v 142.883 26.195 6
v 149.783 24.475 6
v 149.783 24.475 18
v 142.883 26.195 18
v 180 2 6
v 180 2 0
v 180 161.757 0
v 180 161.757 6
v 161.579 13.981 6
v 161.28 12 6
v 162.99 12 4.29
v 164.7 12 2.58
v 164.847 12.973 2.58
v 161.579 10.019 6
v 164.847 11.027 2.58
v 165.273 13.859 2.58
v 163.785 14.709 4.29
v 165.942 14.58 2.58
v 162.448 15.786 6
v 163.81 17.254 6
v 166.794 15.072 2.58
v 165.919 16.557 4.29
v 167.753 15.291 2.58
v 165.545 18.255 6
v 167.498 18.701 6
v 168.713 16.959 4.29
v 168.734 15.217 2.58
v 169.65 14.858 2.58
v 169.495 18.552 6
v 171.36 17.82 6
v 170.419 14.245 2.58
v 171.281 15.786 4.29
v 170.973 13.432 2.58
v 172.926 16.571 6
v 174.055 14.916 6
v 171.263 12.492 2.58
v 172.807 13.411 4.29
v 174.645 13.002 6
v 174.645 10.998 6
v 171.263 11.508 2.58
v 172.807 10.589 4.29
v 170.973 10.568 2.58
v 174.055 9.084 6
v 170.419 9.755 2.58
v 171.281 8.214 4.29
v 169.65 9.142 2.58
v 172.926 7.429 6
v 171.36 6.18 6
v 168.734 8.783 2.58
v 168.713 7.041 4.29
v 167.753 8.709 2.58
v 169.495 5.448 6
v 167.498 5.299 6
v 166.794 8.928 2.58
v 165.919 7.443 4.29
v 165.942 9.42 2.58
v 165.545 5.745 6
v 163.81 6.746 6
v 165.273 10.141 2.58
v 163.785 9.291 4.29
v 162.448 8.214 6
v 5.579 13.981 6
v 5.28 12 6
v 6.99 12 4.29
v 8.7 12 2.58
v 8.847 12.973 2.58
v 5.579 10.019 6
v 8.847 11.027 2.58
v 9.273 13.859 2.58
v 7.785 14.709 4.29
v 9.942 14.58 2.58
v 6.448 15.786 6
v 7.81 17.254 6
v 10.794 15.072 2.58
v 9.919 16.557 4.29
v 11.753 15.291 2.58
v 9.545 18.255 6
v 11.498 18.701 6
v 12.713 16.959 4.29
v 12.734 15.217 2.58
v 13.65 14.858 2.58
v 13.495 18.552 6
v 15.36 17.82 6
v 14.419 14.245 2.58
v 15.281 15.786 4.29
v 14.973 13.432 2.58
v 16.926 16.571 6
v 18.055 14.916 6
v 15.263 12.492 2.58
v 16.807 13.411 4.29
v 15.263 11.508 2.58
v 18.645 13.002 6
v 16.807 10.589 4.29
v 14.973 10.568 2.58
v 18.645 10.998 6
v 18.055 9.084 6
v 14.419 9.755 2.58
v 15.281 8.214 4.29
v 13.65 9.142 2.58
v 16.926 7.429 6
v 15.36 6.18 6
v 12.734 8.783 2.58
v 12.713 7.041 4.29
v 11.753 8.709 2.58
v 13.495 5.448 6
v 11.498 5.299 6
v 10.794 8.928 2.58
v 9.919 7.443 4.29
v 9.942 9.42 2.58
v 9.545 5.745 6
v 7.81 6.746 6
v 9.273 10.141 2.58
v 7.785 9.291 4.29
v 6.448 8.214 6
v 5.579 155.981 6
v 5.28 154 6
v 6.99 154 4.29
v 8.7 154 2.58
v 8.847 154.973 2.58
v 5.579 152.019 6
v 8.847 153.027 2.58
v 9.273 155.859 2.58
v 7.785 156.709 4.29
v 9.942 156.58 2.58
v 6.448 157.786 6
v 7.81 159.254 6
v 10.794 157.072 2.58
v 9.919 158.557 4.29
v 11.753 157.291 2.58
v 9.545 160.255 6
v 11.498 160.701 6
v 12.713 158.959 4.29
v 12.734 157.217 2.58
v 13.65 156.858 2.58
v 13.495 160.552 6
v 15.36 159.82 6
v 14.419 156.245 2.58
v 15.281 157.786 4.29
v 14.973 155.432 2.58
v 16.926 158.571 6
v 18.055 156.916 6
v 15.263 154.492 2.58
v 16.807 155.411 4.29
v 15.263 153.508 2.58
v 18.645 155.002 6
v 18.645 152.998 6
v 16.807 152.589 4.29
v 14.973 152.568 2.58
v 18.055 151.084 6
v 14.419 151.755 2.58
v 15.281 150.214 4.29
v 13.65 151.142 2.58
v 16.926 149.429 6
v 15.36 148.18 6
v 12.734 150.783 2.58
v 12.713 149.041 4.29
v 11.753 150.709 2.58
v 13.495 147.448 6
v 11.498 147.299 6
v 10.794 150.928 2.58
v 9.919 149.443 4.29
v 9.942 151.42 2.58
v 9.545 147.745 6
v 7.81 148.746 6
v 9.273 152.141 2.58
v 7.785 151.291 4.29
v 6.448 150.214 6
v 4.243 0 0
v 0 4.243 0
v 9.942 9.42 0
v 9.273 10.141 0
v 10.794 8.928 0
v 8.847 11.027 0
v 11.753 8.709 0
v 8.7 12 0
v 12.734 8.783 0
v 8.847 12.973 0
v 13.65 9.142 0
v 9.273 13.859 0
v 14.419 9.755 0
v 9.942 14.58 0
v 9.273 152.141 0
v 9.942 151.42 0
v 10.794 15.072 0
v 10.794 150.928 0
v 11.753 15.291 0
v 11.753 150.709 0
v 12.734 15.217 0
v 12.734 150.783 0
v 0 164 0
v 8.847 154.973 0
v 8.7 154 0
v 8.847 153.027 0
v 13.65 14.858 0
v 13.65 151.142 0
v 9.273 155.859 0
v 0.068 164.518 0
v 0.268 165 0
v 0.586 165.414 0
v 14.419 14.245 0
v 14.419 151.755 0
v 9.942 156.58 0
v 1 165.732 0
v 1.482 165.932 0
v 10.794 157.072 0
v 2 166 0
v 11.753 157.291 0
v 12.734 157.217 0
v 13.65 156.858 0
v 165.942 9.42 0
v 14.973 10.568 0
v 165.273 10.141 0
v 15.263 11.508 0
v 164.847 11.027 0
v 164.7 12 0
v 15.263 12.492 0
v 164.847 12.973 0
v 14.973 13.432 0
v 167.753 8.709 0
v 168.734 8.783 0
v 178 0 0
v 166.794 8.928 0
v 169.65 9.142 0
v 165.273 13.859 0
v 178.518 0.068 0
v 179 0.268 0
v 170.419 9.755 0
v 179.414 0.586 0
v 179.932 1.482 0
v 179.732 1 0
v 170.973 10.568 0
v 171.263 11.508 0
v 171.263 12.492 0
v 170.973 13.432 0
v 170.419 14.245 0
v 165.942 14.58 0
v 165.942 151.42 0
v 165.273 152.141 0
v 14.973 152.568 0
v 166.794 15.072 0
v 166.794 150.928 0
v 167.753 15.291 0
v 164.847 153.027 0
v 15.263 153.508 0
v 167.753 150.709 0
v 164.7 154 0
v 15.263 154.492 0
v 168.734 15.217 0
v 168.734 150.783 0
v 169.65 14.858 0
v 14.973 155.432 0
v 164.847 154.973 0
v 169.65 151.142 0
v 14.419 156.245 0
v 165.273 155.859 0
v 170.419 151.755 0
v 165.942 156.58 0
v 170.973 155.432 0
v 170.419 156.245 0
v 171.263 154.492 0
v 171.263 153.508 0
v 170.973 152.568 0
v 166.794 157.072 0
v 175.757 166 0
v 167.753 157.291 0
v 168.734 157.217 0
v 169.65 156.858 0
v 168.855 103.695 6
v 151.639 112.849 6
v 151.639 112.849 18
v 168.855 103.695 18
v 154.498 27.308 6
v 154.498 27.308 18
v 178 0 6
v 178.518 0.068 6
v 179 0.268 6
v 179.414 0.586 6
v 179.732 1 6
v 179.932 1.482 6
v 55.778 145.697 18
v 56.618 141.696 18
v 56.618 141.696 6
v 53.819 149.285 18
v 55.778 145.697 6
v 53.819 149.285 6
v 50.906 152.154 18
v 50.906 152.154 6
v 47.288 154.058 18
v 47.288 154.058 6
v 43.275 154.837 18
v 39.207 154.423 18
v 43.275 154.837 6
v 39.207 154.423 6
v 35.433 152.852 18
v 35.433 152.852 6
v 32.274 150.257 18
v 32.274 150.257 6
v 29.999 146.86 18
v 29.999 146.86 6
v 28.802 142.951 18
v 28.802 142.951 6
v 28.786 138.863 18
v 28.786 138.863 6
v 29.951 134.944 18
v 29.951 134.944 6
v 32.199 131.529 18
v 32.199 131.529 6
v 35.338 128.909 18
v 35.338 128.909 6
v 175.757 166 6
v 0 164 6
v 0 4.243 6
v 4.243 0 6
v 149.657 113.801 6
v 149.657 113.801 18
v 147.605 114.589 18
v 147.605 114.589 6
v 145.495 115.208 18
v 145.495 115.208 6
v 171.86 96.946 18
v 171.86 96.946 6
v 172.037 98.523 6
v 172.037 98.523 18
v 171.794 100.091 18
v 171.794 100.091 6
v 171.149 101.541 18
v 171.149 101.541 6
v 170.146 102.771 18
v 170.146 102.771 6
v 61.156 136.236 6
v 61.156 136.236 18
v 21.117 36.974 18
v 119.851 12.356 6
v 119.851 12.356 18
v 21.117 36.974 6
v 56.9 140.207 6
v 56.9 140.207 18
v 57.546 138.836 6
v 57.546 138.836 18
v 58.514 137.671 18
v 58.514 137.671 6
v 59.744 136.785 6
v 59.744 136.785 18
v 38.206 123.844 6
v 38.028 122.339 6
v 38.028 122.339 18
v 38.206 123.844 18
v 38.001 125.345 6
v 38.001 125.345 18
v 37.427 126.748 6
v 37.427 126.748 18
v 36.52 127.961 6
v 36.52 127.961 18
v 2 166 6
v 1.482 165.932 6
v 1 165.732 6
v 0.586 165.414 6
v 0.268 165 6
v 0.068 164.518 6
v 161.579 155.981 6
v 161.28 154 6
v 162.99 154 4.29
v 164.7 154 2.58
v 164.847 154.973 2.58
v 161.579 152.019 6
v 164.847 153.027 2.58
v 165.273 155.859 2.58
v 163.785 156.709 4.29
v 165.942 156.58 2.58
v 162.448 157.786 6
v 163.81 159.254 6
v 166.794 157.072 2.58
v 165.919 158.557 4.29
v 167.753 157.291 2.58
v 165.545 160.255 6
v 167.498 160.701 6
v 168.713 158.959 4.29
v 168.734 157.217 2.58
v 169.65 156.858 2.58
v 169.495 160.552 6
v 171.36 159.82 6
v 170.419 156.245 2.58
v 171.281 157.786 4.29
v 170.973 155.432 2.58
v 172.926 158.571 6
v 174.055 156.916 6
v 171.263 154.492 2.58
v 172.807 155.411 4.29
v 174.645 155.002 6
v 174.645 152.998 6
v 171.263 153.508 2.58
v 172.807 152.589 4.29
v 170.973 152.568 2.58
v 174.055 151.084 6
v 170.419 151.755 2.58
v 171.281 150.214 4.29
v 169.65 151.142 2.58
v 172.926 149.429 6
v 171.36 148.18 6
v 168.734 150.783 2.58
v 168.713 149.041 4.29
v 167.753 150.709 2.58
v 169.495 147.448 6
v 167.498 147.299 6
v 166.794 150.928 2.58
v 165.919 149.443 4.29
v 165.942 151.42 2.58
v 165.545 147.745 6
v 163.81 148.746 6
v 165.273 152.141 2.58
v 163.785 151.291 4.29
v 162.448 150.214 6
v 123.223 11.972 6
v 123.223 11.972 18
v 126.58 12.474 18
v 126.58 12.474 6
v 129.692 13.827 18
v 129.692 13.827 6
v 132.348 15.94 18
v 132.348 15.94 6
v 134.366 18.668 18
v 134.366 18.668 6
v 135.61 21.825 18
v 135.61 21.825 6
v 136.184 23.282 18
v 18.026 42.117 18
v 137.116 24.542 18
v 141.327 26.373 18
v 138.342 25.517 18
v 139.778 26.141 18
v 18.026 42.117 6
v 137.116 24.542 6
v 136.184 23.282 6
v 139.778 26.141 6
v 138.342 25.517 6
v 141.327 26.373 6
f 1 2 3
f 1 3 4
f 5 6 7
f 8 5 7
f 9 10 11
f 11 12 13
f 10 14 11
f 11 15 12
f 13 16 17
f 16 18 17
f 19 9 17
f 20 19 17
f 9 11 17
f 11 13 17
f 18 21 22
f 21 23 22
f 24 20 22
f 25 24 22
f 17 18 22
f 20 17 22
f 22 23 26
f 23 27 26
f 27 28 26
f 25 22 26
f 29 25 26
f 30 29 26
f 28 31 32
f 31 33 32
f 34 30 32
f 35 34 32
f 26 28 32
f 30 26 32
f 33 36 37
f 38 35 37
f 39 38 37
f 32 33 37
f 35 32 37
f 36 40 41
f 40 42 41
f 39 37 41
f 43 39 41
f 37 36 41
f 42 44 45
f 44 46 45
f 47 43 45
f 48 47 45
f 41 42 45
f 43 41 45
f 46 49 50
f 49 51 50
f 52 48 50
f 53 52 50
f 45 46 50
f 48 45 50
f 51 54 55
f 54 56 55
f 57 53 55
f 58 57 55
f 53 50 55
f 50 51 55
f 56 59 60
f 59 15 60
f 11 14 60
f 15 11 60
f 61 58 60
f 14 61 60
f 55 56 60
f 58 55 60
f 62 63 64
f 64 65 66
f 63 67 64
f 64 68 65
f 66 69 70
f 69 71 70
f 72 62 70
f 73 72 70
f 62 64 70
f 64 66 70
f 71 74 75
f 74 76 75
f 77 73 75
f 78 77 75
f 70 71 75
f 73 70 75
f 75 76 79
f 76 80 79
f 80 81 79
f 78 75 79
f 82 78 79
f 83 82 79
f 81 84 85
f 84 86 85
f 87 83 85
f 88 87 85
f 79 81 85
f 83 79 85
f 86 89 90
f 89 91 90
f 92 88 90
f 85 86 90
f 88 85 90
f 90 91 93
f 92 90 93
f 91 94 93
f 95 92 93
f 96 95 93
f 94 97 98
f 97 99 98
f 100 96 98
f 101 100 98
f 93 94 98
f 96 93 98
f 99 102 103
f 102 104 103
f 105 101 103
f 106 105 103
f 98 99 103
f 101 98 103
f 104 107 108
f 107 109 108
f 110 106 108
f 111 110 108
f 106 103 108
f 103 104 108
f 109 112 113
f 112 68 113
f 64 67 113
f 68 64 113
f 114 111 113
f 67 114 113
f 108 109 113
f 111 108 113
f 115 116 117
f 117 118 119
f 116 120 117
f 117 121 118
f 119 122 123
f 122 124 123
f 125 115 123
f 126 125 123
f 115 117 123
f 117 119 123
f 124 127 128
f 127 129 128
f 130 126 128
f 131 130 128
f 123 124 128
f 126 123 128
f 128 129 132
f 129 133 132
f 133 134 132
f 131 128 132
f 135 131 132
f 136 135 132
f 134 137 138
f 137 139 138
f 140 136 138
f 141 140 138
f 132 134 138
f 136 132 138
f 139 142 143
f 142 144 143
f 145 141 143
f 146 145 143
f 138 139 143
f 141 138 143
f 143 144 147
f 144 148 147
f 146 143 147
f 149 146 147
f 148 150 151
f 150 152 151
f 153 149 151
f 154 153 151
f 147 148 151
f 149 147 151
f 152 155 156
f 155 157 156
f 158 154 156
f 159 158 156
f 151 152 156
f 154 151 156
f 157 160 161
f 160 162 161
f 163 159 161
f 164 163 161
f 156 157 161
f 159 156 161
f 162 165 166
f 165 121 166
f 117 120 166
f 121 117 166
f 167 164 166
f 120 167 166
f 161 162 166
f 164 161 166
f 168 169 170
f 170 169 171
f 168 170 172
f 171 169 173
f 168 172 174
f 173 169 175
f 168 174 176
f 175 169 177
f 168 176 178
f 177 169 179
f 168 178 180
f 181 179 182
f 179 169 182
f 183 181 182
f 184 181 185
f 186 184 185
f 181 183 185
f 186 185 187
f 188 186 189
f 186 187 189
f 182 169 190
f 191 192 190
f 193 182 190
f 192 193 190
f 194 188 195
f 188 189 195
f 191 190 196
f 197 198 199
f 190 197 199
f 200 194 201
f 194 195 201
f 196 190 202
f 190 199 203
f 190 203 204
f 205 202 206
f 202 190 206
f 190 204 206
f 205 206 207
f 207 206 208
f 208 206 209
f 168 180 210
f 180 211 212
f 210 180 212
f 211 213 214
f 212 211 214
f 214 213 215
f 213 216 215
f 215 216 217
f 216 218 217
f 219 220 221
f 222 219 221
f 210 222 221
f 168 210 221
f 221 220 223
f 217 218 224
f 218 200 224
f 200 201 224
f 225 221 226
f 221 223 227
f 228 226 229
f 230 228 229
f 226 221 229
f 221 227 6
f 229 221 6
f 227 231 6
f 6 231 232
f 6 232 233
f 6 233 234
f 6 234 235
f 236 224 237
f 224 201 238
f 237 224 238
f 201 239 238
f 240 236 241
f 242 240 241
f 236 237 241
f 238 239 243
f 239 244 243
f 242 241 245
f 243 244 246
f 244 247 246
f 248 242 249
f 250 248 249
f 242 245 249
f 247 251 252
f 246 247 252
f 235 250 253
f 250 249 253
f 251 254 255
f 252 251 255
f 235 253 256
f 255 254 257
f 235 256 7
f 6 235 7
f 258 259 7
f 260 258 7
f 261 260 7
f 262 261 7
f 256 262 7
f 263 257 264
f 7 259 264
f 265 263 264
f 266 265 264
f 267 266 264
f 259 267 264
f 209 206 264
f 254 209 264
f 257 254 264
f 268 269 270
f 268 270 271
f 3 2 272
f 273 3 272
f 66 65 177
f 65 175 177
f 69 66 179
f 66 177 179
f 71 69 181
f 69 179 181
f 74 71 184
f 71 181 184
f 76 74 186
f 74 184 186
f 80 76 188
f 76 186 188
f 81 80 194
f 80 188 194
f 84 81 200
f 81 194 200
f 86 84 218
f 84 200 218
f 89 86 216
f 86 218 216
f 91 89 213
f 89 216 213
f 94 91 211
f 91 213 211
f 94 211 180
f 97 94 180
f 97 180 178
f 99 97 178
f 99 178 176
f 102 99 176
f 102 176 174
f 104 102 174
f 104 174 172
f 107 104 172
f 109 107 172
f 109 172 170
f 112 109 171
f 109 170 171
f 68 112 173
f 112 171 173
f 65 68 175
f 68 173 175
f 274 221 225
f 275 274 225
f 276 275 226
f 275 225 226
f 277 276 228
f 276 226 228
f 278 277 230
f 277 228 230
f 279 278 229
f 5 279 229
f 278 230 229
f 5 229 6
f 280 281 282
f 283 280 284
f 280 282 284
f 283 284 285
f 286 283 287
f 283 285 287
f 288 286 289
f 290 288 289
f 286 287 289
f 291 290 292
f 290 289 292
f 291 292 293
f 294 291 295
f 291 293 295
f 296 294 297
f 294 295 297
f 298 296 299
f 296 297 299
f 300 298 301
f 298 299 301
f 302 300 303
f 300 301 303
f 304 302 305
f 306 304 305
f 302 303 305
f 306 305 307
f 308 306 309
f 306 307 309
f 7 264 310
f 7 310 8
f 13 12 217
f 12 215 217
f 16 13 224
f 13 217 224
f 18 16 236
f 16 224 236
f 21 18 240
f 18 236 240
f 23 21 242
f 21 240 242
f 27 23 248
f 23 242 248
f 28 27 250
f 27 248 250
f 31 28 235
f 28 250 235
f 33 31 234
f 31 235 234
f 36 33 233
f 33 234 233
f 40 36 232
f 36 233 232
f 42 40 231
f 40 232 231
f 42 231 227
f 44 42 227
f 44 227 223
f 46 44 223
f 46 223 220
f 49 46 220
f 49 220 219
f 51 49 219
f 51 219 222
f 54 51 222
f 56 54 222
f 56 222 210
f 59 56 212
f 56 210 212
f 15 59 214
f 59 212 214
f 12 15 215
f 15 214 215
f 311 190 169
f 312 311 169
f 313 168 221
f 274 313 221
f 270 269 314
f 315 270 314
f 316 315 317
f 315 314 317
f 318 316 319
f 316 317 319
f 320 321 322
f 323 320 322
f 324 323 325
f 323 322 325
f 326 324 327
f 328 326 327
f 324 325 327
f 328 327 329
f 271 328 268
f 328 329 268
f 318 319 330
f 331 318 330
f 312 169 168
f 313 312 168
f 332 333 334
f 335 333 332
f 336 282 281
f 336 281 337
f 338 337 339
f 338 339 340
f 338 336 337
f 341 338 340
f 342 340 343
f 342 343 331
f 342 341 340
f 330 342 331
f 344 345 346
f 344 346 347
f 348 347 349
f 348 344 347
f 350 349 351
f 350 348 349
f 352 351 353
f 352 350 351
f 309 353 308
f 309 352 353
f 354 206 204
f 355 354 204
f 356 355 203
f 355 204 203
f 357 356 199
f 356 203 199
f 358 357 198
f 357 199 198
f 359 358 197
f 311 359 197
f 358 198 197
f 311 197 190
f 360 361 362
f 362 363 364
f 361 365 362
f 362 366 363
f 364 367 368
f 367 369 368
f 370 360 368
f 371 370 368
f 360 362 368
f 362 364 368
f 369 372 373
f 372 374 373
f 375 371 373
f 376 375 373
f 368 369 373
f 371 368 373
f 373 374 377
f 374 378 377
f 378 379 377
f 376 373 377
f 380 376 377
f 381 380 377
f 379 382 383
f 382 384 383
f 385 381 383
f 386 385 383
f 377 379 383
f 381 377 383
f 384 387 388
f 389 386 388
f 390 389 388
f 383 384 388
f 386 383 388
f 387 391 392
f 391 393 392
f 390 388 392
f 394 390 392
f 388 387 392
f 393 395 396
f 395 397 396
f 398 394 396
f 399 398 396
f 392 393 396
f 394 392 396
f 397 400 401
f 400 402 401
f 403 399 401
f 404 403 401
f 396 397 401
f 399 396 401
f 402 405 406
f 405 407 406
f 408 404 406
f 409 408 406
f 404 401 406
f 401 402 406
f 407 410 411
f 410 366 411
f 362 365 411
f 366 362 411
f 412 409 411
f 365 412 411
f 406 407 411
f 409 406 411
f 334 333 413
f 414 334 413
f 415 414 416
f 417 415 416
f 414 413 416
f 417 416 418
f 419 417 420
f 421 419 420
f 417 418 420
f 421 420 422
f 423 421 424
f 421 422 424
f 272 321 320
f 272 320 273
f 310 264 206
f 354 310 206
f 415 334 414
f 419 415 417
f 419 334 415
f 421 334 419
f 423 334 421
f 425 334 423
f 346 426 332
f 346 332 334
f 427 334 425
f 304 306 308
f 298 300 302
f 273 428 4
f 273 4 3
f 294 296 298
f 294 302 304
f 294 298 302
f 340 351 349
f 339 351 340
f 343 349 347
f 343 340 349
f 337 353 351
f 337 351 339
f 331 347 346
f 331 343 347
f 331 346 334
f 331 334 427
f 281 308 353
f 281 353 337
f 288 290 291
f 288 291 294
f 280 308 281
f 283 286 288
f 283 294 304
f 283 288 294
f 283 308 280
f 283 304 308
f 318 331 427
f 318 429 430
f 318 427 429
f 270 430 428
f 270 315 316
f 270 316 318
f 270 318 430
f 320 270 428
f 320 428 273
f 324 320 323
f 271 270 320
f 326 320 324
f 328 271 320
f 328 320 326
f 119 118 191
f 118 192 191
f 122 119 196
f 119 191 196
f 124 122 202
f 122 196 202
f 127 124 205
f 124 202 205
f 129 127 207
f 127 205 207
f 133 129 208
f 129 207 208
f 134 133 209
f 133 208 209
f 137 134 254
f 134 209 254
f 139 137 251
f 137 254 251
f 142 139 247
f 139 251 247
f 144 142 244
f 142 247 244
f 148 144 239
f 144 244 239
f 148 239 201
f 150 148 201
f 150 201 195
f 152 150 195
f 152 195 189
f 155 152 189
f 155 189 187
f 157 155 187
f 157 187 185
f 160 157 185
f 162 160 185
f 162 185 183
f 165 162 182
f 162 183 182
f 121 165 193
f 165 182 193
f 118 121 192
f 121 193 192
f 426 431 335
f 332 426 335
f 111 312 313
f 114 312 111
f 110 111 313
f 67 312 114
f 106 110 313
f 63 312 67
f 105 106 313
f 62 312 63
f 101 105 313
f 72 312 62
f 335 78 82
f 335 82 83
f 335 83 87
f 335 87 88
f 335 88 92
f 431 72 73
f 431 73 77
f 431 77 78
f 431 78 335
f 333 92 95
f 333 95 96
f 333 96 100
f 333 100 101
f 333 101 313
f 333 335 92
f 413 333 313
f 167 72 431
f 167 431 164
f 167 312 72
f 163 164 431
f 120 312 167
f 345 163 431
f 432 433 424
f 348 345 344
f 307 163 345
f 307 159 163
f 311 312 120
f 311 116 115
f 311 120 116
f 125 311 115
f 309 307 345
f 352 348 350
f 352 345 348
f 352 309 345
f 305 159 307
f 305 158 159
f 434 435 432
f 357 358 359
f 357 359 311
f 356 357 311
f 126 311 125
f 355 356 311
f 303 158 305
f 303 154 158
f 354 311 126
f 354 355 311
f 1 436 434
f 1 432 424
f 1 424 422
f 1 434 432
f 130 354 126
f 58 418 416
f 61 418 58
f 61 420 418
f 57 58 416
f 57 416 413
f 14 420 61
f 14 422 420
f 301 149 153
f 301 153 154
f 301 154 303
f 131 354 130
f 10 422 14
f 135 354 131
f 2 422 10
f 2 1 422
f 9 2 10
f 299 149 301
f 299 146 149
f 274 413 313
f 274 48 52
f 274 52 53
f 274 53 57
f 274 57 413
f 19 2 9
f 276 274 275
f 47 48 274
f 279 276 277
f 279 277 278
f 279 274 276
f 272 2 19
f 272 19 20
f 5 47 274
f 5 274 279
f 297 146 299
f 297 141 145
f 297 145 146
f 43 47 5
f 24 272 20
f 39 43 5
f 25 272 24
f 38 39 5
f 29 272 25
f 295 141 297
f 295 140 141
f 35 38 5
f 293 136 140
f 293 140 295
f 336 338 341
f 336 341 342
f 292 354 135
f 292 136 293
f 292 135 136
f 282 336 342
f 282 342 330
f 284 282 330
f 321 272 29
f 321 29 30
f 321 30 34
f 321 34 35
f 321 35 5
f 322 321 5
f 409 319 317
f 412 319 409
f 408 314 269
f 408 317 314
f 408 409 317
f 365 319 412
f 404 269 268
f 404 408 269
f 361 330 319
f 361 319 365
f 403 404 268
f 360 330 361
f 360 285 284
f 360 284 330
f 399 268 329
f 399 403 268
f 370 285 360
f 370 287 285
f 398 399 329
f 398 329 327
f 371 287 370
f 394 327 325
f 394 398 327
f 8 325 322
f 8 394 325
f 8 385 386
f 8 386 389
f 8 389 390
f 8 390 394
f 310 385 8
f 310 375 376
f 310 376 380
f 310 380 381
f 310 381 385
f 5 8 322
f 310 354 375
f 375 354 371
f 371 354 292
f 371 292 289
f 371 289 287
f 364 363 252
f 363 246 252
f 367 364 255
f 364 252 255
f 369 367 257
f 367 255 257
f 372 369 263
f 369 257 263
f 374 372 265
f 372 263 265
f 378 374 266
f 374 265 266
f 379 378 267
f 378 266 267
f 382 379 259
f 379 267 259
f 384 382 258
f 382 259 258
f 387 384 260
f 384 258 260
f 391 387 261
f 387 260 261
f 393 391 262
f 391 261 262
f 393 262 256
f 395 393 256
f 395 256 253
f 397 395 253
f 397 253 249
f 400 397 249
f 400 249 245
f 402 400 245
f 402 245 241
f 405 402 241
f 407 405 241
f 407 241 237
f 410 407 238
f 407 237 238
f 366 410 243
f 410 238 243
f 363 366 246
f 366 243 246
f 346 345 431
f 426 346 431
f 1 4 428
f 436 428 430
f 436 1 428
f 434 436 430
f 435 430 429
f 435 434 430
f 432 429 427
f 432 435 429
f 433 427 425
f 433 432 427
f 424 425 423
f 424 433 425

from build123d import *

# Parameters (mm, degrees)
PAD_DEPTH        = 6
HOLE_D           = 6.6
HOLE_DEPTH       = 25
HOLE_CSINK_D     = 13.44
HOLE_CSINK_ANGLE = 90
PAD001_DEPTH     = 12


with BuildPart() as part:
    # Sketch → Pad (new body)
    with BuildSketch(Plane.XY):
        with BuildLine():
            ThreePointArc((2, 166), (0.585786, 165.414214), (0, 164))
            Line((0, 164), (0, 4.242641))
            Line((0, 4.242641), (4.242641, 0))
            Line((4.242641, 0), (178, 0))
            ThreePointArc((178, 0), (179.414214, 0.585786), (180, 2))
            Line((180, 2), (180, 161.757359))
            Line((175.757359, 166), (180, 161.757359))
            Line((175.757359, 166), (2, 166))
        make_face()
    extrude(amount=PAD_DEPTH)

    # Hole
    with Locations(Plane.XY.offset(6)):
        with Locations((12, 154), (168, 154), (168, 12), (12, 12)):
            CounterSinkHole(HOLE_D / 2, HOLE_CSINK_D / 2, depth=HOLE_DEPTH, counter_sink_angle=HOLE_CSINK_ANGLE)

    # Sketch002 (on Face5 of Hole) → Pad001 (join)
    with BuildSketch(Plane.XY.offset(6)):
        with BuildLine():
            ThreePointArc((56.618237, 141.695686), (35.433188, 152.851689), (35.337576, 128.908975))
            ThreePointArc((38.028145, 122.339284), (37.758773, 126.064762), (35.337576, 128.908975))
            Line((38.028145, 122.339284), (18.026388, 42.116616))
            Line((18.026388, 42.116616), (21.116616, 36.973612))
            Line((119.851347, 12.356279), (21.116616, 36.973612))
            ThreePointArc((119.851347, 12.356279), (129.691827, 13.826949), (135.610176, 21.825139))
            ThreePointArc((142.883482, 26.195382), (138.341722, 25.516611), (135.610176, 21.825139))
            Line((149.78317, 24.475096), (142.883482, 26.195382))
            Line((149.78317, 24.475096), (154.49759, 27.307806))
            Line((171.860307, 96.945859), (154.49759, 27.307806))
            ThreePointArc((171.860307, 96.945859), (171.519804, 100.837813), (168.855356, 103.695079))
            Line((151.638919, 112.849221), (168.855356, 103.695079))
            ThreePointArc((151.638919, 112.849221), (148.639117, 114.216311), (145.495068, 115.207626))
            Line((145.495068, 115.207626), (61.155784, 136.235771))
            ThreePointArc((56.618237, 141.695686), (57.992845, 138.222619), (61.155784, 136.235771))
        make_face()
    extrude(amount=PAD001_DEPTH)


solid = part.part
